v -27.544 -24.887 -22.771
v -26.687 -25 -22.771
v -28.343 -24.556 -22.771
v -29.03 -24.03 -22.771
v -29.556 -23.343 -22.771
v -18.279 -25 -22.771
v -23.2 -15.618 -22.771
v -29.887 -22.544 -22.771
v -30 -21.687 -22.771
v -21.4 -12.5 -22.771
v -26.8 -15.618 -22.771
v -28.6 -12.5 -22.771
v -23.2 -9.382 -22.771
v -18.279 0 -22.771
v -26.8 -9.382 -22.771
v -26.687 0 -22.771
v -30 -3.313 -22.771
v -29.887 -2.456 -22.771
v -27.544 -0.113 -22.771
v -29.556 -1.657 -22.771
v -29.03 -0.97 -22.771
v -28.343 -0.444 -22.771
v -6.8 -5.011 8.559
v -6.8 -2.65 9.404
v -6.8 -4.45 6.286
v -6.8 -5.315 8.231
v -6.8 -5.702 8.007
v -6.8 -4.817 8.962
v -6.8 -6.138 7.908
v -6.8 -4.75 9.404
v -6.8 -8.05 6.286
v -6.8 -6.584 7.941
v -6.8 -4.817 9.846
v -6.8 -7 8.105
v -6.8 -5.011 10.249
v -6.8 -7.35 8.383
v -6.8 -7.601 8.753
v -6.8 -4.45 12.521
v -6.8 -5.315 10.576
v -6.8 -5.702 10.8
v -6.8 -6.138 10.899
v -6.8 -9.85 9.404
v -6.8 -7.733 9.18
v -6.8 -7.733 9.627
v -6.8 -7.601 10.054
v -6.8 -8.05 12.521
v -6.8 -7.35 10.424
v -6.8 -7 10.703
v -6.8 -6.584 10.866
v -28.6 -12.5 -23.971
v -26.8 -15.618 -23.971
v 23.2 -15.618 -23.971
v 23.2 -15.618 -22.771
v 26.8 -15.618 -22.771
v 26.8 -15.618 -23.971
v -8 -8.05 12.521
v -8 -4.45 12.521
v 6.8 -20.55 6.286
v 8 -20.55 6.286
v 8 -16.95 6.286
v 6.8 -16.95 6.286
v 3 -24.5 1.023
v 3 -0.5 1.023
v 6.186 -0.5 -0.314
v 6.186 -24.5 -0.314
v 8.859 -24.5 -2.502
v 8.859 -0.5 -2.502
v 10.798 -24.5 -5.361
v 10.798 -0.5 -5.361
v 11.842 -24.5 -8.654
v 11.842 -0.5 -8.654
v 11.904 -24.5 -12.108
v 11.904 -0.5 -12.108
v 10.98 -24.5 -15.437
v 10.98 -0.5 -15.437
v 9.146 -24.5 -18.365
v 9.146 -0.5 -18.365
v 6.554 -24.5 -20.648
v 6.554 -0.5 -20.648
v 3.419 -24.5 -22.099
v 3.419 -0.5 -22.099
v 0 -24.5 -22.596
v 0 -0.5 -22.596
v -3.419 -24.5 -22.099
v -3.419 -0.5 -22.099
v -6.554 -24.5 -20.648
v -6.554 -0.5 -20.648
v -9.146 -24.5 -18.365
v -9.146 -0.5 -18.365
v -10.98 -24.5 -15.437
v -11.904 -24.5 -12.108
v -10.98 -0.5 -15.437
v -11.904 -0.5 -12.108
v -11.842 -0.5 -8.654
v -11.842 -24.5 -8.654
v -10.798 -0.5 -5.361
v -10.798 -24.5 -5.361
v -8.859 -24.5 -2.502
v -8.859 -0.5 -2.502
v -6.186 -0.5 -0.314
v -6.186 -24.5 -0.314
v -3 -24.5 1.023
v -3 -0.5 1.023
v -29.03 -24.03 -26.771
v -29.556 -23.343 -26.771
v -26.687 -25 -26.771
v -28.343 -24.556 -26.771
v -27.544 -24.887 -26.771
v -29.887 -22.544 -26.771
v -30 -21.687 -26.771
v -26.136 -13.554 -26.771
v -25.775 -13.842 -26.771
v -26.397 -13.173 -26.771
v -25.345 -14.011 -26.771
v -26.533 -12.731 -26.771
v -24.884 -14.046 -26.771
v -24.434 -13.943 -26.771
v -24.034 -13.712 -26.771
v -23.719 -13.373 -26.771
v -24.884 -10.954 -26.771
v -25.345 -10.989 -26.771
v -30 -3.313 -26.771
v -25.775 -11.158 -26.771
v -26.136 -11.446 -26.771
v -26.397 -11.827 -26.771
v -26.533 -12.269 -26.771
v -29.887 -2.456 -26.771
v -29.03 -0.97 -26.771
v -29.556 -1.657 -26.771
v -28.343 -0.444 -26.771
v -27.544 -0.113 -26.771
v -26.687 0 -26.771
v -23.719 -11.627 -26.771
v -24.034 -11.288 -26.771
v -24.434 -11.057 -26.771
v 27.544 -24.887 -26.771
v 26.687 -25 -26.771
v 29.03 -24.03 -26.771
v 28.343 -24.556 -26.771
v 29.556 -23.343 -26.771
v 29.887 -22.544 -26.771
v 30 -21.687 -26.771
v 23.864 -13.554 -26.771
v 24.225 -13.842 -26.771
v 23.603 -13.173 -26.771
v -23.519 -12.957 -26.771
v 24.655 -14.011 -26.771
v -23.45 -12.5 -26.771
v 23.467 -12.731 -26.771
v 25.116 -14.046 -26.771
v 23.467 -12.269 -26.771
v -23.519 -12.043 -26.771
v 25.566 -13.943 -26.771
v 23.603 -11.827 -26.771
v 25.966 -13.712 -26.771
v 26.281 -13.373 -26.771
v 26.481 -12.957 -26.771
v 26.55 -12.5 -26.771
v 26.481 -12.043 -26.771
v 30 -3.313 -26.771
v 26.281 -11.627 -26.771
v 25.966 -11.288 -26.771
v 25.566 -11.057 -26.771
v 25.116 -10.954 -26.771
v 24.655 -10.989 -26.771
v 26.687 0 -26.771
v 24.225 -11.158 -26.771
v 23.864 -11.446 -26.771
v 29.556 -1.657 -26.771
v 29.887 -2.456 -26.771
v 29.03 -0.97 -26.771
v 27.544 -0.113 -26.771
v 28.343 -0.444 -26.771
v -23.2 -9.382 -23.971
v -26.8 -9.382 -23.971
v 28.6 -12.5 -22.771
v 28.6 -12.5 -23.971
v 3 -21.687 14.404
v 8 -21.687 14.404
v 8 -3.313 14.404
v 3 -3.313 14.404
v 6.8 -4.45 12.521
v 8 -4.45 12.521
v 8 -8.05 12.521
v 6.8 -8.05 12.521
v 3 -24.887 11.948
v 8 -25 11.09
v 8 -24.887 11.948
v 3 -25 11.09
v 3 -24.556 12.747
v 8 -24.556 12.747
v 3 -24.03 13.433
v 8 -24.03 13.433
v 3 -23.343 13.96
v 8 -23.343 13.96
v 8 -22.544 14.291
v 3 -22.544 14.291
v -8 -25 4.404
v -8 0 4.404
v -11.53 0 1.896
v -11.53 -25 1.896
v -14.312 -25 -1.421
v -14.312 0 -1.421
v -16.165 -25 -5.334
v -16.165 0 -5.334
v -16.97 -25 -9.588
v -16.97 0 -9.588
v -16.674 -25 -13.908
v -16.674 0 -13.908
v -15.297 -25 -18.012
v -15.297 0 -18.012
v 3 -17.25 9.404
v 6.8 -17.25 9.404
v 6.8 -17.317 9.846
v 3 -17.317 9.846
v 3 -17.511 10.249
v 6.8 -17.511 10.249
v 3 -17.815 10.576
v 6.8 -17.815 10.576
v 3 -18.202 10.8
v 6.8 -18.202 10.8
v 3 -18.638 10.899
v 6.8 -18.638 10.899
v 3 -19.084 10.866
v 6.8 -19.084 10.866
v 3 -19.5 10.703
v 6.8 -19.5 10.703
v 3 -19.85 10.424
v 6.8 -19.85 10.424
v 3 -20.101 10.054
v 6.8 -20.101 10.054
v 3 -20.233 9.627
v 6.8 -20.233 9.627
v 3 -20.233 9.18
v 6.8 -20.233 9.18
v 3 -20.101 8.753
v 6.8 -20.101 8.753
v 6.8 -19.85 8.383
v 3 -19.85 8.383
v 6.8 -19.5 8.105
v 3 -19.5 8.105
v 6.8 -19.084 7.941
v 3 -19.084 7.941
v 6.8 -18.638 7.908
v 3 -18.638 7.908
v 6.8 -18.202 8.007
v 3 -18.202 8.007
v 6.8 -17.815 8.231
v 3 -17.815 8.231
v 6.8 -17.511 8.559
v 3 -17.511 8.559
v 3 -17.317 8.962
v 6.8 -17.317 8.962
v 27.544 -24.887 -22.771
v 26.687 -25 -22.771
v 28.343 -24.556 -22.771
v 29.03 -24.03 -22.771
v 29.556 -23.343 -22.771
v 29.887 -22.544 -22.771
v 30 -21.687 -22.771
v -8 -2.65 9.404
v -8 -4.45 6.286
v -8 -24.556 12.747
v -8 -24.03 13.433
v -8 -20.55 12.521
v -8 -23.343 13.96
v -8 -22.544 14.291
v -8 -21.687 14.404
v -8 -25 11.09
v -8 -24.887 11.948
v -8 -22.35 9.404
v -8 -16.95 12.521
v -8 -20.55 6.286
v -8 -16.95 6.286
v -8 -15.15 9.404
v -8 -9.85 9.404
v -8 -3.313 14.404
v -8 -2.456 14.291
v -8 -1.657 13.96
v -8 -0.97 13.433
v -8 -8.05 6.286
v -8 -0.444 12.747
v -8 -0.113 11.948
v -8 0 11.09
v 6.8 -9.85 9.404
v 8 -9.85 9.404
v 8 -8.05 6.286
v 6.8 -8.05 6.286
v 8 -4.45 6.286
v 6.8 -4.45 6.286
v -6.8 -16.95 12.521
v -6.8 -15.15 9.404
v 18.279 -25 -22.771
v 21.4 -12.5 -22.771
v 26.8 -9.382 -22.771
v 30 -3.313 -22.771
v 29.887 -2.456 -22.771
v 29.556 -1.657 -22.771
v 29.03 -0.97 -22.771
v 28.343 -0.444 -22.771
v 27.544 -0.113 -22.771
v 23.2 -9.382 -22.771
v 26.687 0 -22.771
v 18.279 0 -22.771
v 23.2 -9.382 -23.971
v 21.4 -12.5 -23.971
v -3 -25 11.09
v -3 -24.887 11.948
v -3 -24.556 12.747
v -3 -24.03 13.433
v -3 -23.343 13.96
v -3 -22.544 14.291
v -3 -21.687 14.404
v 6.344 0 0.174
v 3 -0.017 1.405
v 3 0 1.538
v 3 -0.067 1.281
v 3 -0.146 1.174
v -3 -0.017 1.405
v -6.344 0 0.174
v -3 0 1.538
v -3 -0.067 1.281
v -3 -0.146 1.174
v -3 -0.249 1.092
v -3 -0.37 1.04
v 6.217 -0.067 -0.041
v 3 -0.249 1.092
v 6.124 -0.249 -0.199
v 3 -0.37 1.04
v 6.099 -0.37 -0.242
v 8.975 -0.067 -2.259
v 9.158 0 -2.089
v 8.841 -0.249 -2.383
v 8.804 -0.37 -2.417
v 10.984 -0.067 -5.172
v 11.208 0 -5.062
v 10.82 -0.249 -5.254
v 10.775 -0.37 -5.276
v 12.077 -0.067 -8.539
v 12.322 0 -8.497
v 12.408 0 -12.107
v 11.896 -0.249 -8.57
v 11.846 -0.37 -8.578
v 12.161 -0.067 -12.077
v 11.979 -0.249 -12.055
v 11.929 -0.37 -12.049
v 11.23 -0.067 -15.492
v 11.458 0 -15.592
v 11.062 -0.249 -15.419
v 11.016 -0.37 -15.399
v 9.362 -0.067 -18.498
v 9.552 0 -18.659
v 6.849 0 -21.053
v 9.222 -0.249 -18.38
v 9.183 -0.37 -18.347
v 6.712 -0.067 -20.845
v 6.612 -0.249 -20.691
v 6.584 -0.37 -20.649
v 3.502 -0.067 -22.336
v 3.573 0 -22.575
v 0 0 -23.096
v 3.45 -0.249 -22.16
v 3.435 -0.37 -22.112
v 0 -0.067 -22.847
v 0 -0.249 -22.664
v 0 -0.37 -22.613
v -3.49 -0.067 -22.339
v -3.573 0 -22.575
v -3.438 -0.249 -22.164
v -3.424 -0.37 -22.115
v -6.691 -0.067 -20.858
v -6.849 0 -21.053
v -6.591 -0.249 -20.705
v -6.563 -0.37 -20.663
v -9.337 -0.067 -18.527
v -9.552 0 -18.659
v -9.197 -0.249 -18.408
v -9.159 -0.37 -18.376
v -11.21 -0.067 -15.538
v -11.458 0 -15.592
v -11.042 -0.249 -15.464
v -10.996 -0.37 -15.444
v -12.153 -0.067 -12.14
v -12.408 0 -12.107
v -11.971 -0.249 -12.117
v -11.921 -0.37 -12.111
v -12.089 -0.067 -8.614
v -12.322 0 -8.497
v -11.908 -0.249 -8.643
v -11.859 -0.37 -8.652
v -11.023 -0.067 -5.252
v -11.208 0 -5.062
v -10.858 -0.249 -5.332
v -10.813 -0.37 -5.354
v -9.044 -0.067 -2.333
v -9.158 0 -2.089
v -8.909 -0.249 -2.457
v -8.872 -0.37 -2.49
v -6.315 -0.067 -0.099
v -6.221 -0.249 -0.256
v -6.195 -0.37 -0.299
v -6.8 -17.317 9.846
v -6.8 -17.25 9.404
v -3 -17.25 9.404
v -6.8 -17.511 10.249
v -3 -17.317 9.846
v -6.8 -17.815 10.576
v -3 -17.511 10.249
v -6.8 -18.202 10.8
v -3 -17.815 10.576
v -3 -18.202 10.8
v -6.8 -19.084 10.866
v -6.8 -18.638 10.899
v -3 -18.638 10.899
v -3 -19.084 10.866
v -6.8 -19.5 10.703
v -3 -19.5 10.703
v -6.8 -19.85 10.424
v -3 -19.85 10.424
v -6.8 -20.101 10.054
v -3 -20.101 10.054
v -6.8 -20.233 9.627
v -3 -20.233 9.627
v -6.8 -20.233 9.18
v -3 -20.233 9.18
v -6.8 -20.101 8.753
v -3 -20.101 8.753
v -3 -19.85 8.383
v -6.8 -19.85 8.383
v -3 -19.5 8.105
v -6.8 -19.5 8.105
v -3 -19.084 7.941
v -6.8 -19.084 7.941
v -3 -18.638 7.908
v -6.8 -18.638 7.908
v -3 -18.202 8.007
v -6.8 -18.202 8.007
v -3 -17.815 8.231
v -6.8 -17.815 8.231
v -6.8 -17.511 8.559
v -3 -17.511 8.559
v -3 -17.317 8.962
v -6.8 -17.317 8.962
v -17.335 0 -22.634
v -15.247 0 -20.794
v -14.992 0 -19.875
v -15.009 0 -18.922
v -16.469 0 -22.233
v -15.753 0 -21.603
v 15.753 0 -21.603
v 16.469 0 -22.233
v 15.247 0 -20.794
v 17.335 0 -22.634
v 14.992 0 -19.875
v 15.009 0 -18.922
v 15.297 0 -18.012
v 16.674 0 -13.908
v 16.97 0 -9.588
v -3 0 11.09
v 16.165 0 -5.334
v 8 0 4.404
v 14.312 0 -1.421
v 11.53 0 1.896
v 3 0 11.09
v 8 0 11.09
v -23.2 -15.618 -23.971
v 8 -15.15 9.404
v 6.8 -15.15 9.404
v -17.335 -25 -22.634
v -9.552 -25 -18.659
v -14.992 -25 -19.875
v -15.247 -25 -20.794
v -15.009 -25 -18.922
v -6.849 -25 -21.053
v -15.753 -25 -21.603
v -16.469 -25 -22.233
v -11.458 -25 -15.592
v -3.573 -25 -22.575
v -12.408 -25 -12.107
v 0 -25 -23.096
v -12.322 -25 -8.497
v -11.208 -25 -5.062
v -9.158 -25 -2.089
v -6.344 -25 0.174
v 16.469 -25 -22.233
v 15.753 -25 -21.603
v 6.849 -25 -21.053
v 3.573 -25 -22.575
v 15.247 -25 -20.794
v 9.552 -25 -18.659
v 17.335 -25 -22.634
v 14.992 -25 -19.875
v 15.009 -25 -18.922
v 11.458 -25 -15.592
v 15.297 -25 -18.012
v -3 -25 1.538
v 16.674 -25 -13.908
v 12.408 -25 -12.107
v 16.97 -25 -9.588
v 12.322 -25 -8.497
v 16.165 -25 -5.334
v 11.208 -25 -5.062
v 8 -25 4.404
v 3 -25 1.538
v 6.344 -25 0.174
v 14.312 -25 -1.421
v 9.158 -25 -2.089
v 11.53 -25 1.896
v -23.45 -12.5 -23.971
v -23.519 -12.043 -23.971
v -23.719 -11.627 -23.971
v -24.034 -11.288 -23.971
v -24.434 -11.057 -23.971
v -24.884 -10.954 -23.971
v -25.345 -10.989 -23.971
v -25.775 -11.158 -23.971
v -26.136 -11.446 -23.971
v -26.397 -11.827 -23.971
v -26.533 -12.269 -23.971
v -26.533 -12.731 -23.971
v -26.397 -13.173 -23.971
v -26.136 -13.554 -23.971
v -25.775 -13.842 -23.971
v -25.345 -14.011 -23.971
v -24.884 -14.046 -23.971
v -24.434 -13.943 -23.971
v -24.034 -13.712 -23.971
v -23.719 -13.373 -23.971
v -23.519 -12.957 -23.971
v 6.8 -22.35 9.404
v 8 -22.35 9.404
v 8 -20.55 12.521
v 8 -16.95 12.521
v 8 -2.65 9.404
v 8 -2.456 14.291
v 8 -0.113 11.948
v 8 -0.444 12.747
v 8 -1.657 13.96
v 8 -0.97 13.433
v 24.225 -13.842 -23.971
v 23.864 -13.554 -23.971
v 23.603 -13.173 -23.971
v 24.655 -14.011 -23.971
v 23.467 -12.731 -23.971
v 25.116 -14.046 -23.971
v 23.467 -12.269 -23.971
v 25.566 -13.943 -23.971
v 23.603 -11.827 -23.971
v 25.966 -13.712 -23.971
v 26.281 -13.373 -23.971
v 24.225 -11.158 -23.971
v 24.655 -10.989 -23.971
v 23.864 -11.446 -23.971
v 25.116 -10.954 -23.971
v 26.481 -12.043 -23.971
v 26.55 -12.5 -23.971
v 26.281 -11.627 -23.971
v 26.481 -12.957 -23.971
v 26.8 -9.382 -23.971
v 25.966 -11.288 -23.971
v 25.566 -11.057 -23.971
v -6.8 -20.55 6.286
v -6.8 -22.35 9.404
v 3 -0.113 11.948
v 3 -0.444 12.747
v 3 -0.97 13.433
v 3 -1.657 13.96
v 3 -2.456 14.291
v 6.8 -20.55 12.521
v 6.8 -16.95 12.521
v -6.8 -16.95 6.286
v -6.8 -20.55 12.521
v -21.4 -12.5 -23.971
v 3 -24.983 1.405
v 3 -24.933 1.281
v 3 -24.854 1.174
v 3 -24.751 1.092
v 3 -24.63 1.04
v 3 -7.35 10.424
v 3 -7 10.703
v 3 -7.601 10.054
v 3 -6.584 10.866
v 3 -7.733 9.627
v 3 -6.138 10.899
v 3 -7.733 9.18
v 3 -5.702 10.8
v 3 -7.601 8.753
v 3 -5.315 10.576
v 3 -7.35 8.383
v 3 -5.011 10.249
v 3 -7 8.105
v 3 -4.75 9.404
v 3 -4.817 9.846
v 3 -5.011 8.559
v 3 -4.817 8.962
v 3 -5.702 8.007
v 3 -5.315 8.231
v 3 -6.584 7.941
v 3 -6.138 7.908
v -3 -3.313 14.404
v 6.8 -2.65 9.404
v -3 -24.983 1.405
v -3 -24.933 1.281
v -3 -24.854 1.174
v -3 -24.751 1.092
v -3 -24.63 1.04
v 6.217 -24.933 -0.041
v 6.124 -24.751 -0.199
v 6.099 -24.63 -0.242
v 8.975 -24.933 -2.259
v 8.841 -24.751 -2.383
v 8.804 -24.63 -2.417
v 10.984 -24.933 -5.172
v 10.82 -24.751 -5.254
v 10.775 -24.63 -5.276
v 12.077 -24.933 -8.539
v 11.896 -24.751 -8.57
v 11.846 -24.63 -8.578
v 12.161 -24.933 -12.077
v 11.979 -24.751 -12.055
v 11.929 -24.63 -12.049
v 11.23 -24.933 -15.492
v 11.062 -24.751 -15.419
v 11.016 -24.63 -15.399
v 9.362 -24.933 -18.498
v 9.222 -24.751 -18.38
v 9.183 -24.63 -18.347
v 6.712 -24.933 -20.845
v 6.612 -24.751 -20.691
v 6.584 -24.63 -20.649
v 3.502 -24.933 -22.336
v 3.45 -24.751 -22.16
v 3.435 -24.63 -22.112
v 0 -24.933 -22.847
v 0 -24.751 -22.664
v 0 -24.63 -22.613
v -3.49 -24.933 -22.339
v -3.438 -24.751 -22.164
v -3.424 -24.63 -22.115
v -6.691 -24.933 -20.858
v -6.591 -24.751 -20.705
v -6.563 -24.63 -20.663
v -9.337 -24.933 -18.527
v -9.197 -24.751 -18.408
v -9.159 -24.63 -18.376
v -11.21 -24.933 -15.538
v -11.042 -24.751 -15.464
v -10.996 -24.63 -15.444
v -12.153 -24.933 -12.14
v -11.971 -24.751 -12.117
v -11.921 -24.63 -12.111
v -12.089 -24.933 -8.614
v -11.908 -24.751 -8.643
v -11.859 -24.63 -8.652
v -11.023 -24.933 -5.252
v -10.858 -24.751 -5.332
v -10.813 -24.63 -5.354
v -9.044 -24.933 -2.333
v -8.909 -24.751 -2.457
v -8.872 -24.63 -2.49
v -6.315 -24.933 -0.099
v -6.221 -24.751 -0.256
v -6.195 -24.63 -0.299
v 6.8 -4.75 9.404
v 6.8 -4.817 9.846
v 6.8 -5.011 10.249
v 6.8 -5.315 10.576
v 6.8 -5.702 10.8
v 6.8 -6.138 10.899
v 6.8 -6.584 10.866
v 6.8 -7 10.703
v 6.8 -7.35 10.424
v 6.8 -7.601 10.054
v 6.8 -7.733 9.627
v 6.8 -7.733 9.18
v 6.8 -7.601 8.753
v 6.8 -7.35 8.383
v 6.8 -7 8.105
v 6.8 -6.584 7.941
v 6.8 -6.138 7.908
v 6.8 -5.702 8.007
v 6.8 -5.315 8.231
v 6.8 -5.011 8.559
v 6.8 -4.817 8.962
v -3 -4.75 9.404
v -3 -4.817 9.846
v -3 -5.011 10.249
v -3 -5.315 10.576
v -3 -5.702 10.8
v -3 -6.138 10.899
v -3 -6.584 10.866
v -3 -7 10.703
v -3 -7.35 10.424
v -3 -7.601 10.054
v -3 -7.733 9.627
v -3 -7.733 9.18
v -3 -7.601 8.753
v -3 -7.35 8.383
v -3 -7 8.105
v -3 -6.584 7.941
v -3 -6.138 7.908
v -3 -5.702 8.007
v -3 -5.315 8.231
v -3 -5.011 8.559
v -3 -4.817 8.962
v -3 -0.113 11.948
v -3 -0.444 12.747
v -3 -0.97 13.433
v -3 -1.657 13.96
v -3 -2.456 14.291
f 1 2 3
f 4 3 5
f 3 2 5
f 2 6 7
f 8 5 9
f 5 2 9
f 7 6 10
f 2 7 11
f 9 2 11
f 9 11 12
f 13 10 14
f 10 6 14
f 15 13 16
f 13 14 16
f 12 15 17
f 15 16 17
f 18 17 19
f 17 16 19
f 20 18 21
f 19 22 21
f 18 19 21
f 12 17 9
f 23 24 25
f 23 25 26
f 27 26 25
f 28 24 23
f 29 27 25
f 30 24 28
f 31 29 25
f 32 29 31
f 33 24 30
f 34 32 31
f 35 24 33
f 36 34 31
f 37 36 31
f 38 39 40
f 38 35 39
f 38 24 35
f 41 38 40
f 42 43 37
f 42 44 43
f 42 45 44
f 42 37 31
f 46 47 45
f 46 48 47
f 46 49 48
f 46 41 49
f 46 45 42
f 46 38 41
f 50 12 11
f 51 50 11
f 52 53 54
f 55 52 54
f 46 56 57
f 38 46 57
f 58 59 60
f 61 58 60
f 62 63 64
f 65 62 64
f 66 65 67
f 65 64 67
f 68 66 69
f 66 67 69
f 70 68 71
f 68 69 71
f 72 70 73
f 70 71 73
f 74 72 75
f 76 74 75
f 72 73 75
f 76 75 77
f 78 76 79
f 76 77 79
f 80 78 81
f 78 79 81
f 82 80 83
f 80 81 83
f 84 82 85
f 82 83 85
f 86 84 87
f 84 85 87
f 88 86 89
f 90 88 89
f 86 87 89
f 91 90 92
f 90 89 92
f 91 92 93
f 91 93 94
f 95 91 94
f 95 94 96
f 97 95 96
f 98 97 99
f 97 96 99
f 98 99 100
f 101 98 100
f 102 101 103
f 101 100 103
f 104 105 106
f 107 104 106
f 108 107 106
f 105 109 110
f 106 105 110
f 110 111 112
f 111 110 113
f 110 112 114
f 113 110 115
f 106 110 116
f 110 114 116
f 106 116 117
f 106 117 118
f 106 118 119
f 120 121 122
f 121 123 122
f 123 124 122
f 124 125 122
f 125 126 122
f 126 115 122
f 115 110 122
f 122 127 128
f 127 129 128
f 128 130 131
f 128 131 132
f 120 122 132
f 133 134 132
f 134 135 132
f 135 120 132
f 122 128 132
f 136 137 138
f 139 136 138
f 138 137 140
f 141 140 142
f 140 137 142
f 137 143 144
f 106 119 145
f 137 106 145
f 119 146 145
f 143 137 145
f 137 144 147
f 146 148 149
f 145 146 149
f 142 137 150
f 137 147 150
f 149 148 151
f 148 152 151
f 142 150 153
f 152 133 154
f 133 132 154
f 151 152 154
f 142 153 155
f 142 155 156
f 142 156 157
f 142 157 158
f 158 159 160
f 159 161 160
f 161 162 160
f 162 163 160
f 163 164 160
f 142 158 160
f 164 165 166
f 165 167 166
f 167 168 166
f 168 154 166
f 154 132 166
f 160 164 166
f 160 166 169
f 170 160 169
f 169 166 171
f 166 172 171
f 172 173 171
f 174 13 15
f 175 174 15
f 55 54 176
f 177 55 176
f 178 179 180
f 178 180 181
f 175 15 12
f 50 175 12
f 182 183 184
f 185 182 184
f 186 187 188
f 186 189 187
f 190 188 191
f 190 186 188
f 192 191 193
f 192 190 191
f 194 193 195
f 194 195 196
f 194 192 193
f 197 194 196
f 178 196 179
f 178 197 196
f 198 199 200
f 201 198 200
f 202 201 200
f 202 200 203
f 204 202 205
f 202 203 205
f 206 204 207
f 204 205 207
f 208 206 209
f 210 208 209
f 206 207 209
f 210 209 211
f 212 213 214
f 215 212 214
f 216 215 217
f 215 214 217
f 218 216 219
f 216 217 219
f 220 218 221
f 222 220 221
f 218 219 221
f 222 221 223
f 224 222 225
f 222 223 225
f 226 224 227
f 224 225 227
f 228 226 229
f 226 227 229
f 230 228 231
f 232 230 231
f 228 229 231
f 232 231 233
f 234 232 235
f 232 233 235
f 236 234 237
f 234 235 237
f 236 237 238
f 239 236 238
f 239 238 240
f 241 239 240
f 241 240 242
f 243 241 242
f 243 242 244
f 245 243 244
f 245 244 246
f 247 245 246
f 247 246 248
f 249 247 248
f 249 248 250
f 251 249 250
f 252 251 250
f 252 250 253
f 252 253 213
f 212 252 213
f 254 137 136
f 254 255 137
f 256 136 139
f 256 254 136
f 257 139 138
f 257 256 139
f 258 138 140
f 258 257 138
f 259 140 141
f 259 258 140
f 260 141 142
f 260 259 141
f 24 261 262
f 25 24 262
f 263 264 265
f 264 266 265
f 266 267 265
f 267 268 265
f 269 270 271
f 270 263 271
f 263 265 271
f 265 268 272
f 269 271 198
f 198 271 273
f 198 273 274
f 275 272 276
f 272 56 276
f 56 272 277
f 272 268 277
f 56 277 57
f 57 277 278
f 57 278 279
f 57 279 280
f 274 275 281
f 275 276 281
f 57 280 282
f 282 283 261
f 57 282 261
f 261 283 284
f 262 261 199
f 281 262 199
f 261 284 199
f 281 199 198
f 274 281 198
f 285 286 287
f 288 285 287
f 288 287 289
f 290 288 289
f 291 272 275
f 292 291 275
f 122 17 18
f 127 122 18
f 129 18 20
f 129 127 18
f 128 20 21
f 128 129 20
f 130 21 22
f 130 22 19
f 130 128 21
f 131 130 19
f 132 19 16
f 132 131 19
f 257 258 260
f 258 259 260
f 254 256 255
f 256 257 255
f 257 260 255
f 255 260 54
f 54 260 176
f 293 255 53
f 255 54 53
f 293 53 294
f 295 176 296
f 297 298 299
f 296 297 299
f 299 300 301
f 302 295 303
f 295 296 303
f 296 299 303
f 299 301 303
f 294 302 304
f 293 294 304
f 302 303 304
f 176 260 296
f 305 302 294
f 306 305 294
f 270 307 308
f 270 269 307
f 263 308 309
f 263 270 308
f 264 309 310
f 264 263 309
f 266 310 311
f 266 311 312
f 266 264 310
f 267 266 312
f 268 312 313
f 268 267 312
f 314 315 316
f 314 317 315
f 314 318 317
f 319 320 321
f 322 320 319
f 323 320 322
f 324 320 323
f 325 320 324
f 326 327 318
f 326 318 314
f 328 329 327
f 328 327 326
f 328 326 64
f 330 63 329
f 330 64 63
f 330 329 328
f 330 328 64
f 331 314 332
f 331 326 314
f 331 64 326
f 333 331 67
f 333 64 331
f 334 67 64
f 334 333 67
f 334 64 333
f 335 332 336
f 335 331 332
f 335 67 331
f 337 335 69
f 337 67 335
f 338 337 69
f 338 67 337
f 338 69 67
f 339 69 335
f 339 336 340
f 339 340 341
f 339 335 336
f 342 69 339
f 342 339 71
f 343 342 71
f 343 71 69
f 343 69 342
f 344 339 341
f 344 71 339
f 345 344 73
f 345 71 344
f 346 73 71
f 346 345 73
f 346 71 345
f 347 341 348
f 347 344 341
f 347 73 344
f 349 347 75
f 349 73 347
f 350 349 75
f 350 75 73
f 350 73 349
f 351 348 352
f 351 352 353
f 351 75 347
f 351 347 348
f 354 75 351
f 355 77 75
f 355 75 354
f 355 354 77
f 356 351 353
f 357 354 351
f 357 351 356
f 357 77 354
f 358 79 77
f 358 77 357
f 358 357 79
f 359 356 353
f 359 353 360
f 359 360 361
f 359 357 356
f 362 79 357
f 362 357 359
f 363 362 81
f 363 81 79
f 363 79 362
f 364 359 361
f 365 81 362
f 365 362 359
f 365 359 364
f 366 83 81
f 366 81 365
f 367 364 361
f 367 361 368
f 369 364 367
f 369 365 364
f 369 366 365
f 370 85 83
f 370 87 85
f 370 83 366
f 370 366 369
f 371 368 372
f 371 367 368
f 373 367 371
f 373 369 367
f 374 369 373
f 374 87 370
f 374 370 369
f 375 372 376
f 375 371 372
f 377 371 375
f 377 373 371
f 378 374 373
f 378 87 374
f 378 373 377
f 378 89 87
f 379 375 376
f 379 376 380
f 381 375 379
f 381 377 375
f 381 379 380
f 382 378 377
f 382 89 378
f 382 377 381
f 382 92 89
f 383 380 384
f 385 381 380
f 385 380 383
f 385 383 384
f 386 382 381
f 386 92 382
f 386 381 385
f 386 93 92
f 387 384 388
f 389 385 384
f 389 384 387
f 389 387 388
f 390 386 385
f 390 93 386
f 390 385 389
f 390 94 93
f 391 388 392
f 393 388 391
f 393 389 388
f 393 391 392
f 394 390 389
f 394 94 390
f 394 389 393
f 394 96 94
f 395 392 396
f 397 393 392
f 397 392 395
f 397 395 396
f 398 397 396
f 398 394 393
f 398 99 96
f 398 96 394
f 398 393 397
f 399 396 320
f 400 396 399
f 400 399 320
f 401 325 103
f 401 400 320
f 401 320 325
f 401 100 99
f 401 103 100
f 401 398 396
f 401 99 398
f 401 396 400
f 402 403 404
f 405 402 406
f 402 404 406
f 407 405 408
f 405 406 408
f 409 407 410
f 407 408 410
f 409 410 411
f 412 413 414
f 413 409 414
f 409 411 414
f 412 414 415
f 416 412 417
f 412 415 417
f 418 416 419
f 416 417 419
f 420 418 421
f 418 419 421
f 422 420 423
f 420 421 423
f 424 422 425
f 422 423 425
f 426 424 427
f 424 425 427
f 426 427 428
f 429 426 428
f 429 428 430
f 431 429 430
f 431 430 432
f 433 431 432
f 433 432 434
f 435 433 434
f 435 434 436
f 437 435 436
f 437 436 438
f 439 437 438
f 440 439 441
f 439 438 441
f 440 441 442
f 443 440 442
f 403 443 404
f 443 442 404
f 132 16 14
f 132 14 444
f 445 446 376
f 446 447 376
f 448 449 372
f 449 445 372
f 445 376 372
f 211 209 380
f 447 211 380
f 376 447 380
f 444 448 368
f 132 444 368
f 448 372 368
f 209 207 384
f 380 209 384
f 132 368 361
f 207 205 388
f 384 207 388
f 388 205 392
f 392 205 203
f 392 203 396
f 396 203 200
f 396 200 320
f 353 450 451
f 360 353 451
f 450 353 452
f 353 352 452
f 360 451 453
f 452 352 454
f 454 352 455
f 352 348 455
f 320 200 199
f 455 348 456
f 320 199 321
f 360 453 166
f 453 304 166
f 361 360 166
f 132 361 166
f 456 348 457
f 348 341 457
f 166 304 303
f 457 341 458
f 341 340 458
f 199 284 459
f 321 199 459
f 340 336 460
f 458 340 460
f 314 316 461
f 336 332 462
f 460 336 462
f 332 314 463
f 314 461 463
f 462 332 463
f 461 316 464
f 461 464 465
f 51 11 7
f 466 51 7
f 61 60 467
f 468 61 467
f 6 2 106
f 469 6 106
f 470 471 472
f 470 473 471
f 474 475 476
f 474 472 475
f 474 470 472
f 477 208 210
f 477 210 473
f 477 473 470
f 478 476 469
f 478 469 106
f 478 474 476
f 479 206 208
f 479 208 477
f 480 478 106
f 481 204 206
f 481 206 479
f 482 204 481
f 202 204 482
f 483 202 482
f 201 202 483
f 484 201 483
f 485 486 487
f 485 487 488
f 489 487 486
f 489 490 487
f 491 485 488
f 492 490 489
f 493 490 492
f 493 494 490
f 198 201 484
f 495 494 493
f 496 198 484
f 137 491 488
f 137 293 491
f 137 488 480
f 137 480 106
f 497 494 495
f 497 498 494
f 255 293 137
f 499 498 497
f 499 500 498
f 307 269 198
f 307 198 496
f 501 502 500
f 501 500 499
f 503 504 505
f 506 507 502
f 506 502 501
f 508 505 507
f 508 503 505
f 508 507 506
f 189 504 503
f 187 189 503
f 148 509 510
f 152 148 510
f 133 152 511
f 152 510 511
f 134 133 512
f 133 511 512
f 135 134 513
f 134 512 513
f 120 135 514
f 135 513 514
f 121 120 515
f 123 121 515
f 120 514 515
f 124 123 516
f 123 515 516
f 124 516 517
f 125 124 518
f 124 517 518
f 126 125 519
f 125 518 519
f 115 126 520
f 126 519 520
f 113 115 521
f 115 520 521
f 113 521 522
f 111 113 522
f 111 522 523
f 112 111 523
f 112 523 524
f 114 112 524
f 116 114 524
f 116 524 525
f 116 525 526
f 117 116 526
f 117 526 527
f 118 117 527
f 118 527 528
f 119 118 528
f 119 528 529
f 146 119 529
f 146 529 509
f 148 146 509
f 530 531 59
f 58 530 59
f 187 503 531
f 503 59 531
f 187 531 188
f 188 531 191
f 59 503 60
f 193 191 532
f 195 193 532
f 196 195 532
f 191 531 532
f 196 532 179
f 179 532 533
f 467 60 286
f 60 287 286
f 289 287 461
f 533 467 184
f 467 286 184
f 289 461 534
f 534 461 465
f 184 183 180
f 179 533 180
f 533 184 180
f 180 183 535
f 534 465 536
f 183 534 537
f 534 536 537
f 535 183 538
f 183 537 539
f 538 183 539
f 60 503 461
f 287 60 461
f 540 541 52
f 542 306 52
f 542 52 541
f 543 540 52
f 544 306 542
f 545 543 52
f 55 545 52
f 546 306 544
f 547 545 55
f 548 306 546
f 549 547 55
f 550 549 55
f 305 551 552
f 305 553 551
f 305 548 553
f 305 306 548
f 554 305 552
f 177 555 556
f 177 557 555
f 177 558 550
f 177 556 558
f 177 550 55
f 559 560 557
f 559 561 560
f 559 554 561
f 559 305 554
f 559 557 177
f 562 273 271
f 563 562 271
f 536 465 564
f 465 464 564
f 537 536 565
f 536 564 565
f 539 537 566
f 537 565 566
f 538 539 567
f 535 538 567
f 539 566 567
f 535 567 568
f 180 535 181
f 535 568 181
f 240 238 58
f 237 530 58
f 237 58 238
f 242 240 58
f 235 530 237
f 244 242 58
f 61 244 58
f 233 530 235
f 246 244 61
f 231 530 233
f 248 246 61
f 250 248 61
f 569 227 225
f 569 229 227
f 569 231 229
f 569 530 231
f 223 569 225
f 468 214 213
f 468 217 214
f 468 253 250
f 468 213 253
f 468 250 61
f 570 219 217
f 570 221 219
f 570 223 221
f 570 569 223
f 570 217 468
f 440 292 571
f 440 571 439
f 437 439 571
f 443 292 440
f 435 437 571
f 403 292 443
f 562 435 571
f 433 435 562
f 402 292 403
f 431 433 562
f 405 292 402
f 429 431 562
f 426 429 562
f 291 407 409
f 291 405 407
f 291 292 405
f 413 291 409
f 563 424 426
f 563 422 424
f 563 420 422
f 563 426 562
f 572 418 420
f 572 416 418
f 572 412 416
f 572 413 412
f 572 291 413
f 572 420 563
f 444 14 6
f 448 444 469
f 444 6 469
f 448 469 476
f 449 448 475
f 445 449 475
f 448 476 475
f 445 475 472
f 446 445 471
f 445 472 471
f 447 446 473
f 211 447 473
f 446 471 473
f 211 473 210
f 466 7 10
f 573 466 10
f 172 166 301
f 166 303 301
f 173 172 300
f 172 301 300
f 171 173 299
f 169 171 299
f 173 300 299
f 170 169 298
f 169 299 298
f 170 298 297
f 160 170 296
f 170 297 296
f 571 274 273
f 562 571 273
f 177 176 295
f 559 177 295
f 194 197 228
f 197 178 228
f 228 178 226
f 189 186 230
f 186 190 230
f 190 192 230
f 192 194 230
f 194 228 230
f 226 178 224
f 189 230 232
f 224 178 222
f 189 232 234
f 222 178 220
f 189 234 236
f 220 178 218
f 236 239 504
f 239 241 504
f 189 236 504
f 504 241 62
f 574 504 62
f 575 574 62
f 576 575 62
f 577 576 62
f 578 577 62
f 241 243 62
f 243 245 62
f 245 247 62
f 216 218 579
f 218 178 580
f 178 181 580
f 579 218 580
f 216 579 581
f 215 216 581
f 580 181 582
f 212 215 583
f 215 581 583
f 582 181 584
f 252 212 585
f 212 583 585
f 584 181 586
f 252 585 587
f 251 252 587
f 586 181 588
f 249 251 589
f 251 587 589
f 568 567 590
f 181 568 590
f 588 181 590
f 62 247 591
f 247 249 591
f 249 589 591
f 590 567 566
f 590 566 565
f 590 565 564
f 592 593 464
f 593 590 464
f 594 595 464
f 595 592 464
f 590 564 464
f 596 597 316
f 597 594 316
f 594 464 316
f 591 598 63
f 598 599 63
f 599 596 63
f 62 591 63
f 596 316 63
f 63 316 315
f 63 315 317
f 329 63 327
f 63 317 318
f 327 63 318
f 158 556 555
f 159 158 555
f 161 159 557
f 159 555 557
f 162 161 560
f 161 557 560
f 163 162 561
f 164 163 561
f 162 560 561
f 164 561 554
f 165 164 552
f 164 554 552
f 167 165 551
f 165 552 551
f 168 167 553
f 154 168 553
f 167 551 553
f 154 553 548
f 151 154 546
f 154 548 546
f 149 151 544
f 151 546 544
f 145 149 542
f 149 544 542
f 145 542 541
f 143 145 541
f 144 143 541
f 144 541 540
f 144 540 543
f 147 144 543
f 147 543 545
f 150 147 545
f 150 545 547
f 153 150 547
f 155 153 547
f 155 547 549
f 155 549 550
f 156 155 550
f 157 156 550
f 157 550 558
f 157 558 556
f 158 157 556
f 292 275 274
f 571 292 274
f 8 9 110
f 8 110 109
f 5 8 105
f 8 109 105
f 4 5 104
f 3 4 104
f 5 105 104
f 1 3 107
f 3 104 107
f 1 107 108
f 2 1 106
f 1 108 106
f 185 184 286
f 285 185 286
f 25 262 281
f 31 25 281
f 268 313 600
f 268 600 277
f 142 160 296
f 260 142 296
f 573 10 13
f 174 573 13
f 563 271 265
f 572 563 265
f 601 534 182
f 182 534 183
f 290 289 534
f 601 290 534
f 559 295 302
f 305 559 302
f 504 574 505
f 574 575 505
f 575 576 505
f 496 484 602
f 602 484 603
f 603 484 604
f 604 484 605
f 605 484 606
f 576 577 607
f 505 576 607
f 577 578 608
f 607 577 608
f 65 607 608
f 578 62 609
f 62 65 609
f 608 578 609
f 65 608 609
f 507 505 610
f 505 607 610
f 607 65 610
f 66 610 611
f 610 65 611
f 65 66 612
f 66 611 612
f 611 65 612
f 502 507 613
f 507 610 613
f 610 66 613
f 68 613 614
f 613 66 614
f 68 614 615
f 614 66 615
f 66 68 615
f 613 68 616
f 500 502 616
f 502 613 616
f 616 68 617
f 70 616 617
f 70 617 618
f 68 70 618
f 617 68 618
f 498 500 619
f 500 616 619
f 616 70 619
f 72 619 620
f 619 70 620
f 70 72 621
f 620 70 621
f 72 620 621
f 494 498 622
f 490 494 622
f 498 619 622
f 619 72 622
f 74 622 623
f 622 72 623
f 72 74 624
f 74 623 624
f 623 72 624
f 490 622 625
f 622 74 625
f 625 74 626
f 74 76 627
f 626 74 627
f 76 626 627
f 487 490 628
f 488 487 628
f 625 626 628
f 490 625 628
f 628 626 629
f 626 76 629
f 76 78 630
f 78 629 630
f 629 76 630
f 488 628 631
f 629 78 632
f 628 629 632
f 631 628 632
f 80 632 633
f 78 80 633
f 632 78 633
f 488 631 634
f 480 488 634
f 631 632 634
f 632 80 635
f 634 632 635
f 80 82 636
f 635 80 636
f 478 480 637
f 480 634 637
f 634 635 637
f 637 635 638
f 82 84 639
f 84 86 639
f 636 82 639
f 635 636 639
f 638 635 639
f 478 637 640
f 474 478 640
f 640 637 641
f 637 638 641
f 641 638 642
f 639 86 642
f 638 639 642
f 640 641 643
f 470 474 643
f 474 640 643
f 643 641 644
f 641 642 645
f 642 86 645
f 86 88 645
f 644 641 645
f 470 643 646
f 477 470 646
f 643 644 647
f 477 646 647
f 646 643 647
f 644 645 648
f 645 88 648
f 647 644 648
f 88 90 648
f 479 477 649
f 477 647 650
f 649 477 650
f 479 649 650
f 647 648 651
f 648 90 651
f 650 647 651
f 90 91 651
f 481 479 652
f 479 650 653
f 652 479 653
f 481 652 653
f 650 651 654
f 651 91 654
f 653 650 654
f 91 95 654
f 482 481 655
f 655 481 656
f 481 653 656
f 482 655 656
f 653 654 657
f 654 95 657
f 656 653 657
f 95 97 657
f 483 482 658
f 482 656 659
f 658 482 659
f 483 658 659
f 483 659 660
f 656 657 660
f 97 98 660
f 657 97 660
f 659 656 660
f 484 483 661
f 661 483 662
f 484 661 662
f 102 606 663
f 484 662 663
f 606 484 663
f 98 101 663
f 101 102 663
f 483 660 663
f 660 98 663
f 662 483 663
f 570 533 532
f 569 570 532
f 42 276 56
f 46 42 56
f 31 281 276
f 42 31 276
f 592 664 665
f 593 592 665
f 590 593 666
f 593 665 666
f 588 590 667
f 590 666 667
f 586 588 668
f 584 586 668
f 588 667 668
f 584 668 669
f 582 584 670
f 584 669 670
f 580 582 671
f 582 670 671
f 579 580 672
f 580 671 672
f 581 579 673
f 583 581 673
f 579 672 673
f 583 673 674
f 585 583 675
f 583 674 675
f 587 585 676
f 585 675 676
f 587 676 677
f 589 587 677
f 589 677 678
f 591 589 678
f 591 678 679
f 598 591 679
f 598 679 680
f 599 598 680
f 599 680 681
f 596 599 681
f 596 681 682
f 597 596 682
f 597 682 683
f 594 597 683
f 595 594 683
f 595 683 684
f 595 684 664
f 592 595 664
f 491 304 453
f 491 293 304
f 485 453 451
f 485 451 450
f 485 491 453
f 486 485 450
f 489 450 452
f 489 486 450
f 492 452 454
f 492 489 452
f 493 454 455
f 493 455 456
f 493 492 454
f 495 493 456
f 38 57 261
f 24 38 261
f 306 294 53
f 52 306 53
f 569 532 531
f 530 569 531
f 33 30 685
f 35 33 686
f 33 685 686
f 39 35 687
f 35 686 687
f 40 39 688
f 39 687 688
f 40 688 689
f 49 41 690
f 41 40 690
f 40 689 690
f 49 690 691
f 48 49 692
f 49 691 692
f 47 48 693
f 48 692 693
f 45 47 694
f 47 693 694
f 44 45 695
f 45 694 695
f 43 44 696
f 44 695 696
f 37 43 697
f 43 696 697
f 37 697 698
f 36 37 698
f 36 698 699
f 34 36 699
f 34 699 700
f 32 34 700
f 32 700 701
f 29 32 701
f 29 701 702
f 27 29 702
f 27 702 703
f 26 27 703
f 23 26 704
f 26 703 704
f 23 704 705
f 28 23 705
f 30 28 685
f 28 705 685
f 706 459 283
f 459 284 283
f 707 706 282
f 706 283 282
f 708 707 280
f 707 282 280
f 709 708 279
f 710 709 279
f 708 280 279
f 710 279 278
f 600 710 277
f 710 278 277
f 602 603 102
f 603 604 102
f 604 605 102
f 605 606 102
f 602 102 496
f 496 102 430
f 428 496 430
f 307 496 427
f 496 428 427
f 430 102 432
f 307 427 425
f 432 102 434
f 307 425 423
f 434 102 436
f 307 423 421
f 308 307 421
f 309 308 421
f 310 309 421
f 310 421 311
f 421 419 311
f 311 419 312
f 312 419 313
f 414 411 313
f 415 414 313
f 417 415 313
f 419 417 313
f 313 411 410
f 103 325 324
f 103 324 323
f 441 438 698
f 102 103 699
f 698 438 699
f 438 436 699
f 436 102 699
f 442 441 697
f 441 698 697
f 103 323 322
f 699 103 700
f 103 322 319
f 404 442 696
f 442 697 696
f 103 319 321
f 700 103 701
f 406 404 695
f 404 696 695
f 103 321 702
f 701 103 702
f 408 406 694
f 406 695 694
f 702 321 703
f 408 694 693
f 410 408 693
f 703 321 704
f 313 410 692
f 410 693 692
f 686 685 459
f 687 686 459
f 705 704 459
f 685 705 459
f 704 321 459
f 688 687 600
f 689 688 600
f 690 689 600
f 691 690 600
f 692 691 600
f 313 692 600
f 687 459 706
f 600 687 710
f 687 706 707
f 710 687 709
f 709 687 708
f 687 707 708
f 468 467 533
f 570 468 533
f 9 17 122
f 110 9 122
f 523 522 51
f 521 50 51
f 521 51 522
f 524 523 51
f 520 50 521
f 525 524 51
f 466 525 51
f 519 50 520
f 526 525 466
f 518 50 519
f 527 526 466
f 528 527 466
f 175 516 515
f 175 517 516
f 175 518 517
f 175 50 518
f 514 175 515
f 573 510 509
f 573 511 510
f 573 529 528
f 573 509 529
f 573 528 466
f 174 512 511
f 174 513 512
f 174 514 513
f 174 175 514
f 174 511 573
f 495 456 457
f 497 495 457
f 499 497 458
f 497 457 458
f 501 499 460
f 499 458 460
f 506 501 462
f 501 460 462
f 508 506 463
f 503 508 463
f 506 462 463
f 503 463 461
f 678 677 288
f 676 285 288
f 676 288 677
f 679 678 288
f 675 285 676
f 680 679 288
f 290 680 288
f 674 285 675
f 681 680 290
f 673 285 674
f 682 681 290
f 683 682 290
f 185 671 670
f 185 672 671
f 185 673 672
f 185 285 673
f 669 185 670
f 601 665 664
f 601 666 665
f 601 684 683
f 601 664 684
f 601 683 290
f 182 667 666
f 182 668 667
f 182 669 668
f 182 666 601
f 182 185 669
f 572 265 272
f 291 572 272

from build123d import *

# Parameters (mm, degrees)
F1_DEPTH  = 25
F2_R      = 1.55
F3_DEPTH  = 25
F4_R      = 1.5
F5_DEPTH  = 25
F6_R      = 3.3134143982
F9_DEPTH  = 1.2
F8_R      = 1.5
F10_DEPTH = 1.2
F12_DEPTH = 1.2
F13_R     = 0.5


# Not quite as in the source:
# - ends of sketch curves that miss each other by under 0.0002 mm in the source are joined


with BuildPart() as f1:
    # F0 (on Front) → F1 (new body)
    with BuildSketch(Plane.XZ):
        with BuildLine():
            Line((-30, -26.7712218283), (30, -26.771222222))
            Line((30, -26.771222222), (30, -22.771222222))
            Line((30, -22.771222222), (11.8647393899, -22.7712218283))
            ThreePointArc((11.8647393899, -22.7712218283), (16.8306466966, -8.2027211962), (8, 4.4036710302))
            Line((8, 4.4036710302), (8, 14.4036710302))
            Line((8, 14.4036710302), (3, 14.4036710302))
            Line((3, 14.4036710302), (3, 6.1368714524))
            Line((3, 6.1368714524), (3, 4.8868714524))
            Line((3, 4.8868714524), (3, 1.0226200218))
            ThreePointArc((3, 1.0226200218), (0, -22.5963300169), (-3, 1.0226200218))
            Line((-3, 1.0226200218), (-3, 4.8868714524))
            Line((-3, 4.8868714524), (-3, 14.4036710302))
            Line((-3, 14.4036710302), (-8, 14.4036710302))
            Line((-8, 14.4036710302), (-8, 4.4036710302))
            ThreePointArc((-8, 4.4036710302), (-16.8306466966, -8.2027211962), (-11.8647393899, -22.7712218283))
            Line((-11.8647393899, -22.7712218283), (-30, -22.7712218283))
            Line((-30, -22.7712218283), (-30, -26.7712218283))
        make_face()
    extrude(amount=F1_DEPTH)

    # F2 (on face) → F3 (cut)
    with BuildSketch(Plane.XY.offset(-22.7712218283)):
        with Locations((-25, -12.5)):
            Circle(F2_R)
        with Locations((25, -12.5)):
            Circle(F2_R)
    extrude(amount=-F3_DEPTH, mode=Mode.SUBTRACT)

    # F4 (on face) → F5 (cut)
    with BuildSketch(Plane.YZ.offset(8)):
        with Locations((-18.75, 9.4036710302)):
            Circle(F4_R)
        with Locations((-6.25, 9.4036710302)):
            Circle(F4_R)
    extrude(amount=-F5_DEPTH, mode=Mode.SUBTRACT)

    # F6
    f6_edges = [f1.edges().sort_by_distance(p)[0] for p in [
        (-5.5, -25, 14.403671),
        (5.5, -25, 14.403671),
        (-5.5, 0, 14.403671),
        (5.5, 0, 14.403671),
        (30, -25, -24.771222),
        (30, 0, -24.771222),
        (-30, 0, -24.771222),
        (-30, -25, -24.771222),
        (11.864739, -12.5, -22.771222),
        (-11.864739, -12.5, -22.771222),
    ]]
    fillet(f6_edges, radius=F6_R)

    # F7 (on face) → F9 (cut)
    with BuildSketch(Plane.YZ.offset(8)):
        Polygon((-20.55, 6.2859795766), (-16.95, 6.2859795766), (-15.15, 9.4036710302), (-16.95, 12.5213624838), (-20.55, 12.5213624838), (-22.35, 9.4036710302), align=None)
        Polygon((-4.45, 12.5213624838), (-8.05, 12.5213624838), (-9.85, 9.4036710302), (-8.05, 6.2859795766), (-4.45, 6.2859795766), (-2.65, 9.4036710302), align=None)
    extrude(amount=-F9_DEPTH, mode=Mode.SUBTRACT)

    # F8 (on face) → F10 (cut)
    with BuildSketch(Plane(origin=(-8, 0, 0), x_dir=(0, -1, 0), z_dir=(-1, 0, 0))):
        Polygon((4.45, 6.2859795766), (8.05, 6.2859795766), (9.85, 9.4036710302), (8.05, 12.5213624838), (4.45, 12.5213624838), (2.65, 9.4036710302), align=None)
        with Locations((6.25, 9.4036710302)):
            Circle(F8_R, mode=Mode.SUBTRACT)
        Polygon((20.55, 12.5213624838), (16.95, 12.5213624838), (15.15, 9.4036710302), (16.95, 6.2859795766), (20.55, 6.2859795766), (22.35, 9.4036710302), align=None)
        with Locations((18.75, 9.4036710302)):
            Circle(F8_R, mode=Mode.SUBTRACT)
    extrude(amount=-F10_DEPTH, mode=Mode.SUBTRACT)

    # F11 (on face) → F12 (cut)
    with BuildSketch(Plane.XY.offset(-22.7712218283)):
        Polygon((26.8, -9.3823085464), (23.2, -9.3823085464), (21.4, -12.5), (23.2, -15.6176914536), (26.8, -15.6176914536), (28.6, -12.5), align=None)
        Polygon((-23.2, -15.6176914536), (-21.4, -12.5), (-23.2, -9.3823085464), (-26.8, -9.3823085464), (-28.6, -12.5), (-26.8, -15.6176914536), align=None)
    extrude(amount=-F12_DEPTH, mode=Mode.SUBTRACT)

    # F13
    f13_edges = [f1.edges().sort_by_distance(p)[0] for p in [
        (0, 0, -22.59633),
        (0, -25, -22.59633),
    ]]
    fillet(f13_edges, radius=F13_R)


solid = f1.part
